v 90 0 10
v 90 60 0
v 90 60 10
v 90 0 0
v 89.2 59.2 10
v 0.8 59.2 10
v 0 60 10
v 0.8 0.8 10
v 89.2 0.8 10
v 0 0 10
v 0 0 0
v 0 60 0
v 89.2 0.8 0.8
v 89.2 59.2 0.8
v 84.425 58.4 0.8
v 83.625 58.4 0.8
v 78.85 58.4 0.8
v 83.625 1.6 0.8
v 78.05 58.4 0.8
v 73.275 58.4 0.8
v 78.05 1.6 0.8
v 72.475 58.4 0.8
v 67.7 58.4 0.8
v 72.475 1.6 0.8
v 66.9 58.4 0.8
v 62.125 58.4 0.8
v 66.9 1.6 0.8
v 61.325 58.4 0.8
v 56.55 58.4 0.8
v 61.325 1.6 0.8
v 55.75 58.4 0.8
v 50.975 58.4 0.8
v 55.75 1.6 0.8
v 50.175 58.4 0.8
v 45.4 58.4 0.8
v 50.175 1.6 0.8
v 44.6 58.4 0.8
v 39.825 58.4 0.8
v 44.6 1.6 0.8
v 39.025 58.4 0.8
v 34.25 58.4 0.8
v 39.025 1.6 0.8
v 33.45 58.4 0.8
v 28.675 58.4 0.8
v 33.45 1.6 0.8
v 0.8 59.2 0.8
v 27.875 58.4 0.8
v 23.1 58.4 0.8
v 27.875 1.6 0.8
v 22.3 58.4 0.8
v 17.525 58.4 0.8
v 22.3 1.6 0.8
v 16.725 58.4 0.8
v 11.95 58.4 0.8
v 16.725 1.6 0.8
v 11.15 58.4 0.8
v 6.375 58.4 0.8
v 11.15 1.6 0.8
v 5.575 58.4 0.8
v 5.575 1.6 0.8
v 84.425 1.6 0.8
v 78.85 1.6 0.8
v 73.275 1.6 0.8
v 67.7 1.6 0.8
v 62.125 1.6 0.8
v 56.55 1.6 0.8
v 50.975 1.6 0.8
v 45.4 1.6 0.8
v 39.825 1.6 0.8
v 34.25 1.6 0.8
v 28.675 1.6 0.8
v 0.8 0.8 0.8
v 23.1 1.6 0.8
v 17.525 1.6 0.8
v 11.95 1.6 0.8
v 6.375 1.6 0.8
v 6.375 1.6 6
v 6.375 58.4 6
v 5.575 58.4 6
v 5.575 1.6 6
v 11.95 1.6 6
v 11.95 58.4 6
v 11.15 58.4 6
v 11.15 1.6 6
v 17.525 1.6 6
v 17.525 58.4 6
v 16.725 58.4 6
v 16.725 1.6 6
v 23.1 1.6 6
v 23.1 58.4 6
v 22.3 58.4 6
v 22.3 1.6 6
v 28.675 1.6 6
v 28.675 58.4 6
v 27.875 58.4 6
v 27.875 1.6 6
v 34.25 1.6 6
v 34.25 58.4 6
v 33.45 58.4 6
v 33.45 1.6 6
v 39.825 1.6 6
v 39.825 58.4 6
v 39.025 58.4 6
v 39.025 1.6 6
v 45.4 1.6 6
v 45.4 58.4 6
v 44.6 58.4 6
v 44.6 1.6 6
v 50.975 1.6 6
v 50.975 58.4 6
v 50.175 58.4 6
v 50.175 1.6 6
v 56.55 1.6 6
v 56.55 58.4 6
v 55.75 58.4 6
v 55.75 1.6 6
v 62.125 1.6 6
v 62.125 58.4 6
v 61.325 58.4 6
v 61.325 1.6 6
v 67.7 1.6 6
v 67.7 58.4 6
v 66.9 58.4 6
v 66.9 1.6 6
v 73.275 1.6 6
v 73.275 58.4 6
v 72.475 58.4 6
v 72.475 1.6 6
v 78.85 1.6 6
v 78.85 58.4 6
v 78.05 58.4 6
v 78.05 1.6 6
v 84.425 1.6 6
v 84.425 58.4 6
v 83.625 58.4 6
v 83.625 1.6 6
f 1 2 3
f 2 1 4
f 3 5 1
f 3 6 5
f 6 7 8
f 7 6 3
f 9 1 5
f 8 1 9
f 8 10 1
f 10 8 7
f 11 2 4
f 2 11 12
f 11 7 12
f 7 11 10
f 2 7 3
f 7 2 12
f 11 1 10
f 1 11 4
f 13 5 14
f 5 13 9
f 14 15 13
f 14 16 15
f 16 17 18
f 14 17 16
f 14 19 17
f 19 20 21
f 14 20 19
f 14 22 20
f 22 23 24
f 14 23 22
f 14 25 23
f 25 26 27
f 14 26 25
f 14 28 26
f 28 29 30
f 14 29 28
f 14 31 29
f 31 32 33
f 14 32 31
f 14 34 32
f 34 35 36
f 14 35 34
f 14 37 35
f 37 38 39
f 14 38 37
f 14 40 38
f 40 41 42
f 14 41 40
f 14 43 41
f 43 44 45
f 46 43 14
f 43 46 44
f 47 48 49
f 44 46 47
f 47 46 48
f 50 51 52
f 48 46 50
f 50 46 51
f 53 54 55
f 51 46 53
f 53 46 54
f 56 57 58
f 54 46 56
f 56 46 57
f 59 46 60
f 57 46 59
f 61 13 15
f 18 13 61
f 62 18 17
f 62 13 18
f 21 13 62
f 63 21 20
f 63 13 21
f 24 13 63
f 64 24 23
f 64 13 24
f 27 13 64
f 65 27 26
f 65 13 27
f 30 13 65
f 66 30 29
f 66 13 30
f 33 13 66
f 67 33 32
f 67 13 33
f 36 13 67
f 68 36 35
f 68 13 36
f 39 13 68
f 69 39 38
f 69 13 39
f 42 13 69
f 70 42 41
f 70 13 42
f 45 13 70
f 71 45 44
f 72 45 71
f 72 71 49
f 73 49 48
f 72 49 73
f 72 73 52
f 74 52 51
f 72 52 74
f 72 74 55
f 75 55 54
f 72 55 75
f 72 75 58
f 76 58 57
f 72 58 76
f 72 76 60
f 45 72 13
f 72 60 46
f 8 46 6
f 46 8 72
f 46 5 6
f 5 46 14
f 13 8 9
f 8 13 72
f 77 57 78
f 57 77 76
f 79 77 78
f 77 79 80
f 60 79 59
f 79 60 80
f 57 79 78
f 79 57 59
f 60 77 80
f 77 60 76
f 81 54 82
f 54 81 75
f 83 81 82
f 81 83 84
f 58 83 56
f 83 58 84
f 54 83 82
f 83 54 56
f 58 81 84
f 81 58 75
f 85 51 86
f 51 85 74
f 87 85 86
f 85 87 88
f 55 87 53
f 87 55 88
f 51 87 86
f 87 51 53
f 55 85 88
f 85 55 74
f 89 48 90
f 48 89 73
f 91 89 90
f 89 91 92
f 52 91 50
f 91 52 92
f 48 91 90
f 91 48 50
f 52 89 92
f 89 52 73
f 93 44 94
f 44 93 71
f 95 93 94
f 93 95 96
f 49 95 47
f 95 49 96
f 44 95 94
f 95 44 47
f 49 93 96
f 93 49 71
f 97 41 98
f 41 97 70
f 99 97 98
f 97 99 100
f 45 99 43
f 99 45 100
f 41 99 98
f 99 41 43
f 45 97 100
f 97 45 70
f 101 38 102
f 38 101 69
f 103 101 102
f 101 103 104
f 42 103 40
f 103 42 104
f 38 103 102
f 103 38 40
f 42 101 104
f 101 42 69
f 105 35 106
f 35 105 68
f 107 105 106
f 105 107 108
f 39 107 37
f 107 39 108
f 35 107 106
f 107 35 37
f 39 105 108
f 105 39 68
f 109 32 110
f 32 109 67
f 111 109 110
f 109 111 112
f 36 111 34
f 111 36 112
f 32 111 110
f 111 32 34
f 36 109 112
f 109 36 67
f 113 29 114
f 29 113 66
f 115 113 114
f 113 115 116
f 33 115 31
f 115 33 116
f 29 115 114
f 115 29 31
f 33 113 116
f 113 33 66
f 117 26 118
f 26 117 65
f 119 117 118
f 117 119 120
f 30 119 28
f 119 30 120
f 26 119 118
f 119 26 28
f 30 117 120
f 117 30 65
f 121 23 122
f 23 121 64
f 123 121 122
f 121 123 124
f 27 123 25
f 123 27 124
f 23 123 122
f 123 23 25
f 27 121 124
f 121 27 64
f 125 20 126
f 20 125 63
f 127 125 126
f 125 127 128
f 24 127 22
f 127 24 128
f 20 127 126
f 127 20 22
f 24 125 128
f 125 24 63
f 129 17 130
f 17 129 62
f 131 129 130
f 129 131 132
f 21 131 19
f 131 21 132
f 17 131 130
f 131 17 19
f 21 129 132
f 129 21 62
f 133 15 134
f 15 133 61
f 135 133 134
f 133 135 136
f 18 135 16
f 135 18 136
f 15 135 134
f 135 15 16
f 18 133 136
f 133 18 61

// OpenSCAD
// this is the x/y size of the tray
width_x = 90;
width_y = 60;

// the deepth of the tray and the fins
depth = 10;
depth_fins = 6;

//how many fins you want
count_fins = 15;

// how thick the walls/floor should be
wall_width = 0.8;

// the spacing for the fins is calculated
spacing = (width_x - (count_fins+2) * wall_width) / (count_fins+1);

module plantTray(){
    difference() {
        cube([width_x,width_y,depth]);
        translate([wall_width,wall_width,wall_width])
            cube([width_x-2*wall_width,width_y-2*wall_width,depth]);
    }
    for (i = [1:(width_x-2*wall_width)/(spacing+wall_width)]) {
        translate([i * (spacing+wall_width), 2*wall_width, 0]) 
            cube([wall_width, width_y-4*wall_width,depth_fins]);
    }
}
plantTray();
